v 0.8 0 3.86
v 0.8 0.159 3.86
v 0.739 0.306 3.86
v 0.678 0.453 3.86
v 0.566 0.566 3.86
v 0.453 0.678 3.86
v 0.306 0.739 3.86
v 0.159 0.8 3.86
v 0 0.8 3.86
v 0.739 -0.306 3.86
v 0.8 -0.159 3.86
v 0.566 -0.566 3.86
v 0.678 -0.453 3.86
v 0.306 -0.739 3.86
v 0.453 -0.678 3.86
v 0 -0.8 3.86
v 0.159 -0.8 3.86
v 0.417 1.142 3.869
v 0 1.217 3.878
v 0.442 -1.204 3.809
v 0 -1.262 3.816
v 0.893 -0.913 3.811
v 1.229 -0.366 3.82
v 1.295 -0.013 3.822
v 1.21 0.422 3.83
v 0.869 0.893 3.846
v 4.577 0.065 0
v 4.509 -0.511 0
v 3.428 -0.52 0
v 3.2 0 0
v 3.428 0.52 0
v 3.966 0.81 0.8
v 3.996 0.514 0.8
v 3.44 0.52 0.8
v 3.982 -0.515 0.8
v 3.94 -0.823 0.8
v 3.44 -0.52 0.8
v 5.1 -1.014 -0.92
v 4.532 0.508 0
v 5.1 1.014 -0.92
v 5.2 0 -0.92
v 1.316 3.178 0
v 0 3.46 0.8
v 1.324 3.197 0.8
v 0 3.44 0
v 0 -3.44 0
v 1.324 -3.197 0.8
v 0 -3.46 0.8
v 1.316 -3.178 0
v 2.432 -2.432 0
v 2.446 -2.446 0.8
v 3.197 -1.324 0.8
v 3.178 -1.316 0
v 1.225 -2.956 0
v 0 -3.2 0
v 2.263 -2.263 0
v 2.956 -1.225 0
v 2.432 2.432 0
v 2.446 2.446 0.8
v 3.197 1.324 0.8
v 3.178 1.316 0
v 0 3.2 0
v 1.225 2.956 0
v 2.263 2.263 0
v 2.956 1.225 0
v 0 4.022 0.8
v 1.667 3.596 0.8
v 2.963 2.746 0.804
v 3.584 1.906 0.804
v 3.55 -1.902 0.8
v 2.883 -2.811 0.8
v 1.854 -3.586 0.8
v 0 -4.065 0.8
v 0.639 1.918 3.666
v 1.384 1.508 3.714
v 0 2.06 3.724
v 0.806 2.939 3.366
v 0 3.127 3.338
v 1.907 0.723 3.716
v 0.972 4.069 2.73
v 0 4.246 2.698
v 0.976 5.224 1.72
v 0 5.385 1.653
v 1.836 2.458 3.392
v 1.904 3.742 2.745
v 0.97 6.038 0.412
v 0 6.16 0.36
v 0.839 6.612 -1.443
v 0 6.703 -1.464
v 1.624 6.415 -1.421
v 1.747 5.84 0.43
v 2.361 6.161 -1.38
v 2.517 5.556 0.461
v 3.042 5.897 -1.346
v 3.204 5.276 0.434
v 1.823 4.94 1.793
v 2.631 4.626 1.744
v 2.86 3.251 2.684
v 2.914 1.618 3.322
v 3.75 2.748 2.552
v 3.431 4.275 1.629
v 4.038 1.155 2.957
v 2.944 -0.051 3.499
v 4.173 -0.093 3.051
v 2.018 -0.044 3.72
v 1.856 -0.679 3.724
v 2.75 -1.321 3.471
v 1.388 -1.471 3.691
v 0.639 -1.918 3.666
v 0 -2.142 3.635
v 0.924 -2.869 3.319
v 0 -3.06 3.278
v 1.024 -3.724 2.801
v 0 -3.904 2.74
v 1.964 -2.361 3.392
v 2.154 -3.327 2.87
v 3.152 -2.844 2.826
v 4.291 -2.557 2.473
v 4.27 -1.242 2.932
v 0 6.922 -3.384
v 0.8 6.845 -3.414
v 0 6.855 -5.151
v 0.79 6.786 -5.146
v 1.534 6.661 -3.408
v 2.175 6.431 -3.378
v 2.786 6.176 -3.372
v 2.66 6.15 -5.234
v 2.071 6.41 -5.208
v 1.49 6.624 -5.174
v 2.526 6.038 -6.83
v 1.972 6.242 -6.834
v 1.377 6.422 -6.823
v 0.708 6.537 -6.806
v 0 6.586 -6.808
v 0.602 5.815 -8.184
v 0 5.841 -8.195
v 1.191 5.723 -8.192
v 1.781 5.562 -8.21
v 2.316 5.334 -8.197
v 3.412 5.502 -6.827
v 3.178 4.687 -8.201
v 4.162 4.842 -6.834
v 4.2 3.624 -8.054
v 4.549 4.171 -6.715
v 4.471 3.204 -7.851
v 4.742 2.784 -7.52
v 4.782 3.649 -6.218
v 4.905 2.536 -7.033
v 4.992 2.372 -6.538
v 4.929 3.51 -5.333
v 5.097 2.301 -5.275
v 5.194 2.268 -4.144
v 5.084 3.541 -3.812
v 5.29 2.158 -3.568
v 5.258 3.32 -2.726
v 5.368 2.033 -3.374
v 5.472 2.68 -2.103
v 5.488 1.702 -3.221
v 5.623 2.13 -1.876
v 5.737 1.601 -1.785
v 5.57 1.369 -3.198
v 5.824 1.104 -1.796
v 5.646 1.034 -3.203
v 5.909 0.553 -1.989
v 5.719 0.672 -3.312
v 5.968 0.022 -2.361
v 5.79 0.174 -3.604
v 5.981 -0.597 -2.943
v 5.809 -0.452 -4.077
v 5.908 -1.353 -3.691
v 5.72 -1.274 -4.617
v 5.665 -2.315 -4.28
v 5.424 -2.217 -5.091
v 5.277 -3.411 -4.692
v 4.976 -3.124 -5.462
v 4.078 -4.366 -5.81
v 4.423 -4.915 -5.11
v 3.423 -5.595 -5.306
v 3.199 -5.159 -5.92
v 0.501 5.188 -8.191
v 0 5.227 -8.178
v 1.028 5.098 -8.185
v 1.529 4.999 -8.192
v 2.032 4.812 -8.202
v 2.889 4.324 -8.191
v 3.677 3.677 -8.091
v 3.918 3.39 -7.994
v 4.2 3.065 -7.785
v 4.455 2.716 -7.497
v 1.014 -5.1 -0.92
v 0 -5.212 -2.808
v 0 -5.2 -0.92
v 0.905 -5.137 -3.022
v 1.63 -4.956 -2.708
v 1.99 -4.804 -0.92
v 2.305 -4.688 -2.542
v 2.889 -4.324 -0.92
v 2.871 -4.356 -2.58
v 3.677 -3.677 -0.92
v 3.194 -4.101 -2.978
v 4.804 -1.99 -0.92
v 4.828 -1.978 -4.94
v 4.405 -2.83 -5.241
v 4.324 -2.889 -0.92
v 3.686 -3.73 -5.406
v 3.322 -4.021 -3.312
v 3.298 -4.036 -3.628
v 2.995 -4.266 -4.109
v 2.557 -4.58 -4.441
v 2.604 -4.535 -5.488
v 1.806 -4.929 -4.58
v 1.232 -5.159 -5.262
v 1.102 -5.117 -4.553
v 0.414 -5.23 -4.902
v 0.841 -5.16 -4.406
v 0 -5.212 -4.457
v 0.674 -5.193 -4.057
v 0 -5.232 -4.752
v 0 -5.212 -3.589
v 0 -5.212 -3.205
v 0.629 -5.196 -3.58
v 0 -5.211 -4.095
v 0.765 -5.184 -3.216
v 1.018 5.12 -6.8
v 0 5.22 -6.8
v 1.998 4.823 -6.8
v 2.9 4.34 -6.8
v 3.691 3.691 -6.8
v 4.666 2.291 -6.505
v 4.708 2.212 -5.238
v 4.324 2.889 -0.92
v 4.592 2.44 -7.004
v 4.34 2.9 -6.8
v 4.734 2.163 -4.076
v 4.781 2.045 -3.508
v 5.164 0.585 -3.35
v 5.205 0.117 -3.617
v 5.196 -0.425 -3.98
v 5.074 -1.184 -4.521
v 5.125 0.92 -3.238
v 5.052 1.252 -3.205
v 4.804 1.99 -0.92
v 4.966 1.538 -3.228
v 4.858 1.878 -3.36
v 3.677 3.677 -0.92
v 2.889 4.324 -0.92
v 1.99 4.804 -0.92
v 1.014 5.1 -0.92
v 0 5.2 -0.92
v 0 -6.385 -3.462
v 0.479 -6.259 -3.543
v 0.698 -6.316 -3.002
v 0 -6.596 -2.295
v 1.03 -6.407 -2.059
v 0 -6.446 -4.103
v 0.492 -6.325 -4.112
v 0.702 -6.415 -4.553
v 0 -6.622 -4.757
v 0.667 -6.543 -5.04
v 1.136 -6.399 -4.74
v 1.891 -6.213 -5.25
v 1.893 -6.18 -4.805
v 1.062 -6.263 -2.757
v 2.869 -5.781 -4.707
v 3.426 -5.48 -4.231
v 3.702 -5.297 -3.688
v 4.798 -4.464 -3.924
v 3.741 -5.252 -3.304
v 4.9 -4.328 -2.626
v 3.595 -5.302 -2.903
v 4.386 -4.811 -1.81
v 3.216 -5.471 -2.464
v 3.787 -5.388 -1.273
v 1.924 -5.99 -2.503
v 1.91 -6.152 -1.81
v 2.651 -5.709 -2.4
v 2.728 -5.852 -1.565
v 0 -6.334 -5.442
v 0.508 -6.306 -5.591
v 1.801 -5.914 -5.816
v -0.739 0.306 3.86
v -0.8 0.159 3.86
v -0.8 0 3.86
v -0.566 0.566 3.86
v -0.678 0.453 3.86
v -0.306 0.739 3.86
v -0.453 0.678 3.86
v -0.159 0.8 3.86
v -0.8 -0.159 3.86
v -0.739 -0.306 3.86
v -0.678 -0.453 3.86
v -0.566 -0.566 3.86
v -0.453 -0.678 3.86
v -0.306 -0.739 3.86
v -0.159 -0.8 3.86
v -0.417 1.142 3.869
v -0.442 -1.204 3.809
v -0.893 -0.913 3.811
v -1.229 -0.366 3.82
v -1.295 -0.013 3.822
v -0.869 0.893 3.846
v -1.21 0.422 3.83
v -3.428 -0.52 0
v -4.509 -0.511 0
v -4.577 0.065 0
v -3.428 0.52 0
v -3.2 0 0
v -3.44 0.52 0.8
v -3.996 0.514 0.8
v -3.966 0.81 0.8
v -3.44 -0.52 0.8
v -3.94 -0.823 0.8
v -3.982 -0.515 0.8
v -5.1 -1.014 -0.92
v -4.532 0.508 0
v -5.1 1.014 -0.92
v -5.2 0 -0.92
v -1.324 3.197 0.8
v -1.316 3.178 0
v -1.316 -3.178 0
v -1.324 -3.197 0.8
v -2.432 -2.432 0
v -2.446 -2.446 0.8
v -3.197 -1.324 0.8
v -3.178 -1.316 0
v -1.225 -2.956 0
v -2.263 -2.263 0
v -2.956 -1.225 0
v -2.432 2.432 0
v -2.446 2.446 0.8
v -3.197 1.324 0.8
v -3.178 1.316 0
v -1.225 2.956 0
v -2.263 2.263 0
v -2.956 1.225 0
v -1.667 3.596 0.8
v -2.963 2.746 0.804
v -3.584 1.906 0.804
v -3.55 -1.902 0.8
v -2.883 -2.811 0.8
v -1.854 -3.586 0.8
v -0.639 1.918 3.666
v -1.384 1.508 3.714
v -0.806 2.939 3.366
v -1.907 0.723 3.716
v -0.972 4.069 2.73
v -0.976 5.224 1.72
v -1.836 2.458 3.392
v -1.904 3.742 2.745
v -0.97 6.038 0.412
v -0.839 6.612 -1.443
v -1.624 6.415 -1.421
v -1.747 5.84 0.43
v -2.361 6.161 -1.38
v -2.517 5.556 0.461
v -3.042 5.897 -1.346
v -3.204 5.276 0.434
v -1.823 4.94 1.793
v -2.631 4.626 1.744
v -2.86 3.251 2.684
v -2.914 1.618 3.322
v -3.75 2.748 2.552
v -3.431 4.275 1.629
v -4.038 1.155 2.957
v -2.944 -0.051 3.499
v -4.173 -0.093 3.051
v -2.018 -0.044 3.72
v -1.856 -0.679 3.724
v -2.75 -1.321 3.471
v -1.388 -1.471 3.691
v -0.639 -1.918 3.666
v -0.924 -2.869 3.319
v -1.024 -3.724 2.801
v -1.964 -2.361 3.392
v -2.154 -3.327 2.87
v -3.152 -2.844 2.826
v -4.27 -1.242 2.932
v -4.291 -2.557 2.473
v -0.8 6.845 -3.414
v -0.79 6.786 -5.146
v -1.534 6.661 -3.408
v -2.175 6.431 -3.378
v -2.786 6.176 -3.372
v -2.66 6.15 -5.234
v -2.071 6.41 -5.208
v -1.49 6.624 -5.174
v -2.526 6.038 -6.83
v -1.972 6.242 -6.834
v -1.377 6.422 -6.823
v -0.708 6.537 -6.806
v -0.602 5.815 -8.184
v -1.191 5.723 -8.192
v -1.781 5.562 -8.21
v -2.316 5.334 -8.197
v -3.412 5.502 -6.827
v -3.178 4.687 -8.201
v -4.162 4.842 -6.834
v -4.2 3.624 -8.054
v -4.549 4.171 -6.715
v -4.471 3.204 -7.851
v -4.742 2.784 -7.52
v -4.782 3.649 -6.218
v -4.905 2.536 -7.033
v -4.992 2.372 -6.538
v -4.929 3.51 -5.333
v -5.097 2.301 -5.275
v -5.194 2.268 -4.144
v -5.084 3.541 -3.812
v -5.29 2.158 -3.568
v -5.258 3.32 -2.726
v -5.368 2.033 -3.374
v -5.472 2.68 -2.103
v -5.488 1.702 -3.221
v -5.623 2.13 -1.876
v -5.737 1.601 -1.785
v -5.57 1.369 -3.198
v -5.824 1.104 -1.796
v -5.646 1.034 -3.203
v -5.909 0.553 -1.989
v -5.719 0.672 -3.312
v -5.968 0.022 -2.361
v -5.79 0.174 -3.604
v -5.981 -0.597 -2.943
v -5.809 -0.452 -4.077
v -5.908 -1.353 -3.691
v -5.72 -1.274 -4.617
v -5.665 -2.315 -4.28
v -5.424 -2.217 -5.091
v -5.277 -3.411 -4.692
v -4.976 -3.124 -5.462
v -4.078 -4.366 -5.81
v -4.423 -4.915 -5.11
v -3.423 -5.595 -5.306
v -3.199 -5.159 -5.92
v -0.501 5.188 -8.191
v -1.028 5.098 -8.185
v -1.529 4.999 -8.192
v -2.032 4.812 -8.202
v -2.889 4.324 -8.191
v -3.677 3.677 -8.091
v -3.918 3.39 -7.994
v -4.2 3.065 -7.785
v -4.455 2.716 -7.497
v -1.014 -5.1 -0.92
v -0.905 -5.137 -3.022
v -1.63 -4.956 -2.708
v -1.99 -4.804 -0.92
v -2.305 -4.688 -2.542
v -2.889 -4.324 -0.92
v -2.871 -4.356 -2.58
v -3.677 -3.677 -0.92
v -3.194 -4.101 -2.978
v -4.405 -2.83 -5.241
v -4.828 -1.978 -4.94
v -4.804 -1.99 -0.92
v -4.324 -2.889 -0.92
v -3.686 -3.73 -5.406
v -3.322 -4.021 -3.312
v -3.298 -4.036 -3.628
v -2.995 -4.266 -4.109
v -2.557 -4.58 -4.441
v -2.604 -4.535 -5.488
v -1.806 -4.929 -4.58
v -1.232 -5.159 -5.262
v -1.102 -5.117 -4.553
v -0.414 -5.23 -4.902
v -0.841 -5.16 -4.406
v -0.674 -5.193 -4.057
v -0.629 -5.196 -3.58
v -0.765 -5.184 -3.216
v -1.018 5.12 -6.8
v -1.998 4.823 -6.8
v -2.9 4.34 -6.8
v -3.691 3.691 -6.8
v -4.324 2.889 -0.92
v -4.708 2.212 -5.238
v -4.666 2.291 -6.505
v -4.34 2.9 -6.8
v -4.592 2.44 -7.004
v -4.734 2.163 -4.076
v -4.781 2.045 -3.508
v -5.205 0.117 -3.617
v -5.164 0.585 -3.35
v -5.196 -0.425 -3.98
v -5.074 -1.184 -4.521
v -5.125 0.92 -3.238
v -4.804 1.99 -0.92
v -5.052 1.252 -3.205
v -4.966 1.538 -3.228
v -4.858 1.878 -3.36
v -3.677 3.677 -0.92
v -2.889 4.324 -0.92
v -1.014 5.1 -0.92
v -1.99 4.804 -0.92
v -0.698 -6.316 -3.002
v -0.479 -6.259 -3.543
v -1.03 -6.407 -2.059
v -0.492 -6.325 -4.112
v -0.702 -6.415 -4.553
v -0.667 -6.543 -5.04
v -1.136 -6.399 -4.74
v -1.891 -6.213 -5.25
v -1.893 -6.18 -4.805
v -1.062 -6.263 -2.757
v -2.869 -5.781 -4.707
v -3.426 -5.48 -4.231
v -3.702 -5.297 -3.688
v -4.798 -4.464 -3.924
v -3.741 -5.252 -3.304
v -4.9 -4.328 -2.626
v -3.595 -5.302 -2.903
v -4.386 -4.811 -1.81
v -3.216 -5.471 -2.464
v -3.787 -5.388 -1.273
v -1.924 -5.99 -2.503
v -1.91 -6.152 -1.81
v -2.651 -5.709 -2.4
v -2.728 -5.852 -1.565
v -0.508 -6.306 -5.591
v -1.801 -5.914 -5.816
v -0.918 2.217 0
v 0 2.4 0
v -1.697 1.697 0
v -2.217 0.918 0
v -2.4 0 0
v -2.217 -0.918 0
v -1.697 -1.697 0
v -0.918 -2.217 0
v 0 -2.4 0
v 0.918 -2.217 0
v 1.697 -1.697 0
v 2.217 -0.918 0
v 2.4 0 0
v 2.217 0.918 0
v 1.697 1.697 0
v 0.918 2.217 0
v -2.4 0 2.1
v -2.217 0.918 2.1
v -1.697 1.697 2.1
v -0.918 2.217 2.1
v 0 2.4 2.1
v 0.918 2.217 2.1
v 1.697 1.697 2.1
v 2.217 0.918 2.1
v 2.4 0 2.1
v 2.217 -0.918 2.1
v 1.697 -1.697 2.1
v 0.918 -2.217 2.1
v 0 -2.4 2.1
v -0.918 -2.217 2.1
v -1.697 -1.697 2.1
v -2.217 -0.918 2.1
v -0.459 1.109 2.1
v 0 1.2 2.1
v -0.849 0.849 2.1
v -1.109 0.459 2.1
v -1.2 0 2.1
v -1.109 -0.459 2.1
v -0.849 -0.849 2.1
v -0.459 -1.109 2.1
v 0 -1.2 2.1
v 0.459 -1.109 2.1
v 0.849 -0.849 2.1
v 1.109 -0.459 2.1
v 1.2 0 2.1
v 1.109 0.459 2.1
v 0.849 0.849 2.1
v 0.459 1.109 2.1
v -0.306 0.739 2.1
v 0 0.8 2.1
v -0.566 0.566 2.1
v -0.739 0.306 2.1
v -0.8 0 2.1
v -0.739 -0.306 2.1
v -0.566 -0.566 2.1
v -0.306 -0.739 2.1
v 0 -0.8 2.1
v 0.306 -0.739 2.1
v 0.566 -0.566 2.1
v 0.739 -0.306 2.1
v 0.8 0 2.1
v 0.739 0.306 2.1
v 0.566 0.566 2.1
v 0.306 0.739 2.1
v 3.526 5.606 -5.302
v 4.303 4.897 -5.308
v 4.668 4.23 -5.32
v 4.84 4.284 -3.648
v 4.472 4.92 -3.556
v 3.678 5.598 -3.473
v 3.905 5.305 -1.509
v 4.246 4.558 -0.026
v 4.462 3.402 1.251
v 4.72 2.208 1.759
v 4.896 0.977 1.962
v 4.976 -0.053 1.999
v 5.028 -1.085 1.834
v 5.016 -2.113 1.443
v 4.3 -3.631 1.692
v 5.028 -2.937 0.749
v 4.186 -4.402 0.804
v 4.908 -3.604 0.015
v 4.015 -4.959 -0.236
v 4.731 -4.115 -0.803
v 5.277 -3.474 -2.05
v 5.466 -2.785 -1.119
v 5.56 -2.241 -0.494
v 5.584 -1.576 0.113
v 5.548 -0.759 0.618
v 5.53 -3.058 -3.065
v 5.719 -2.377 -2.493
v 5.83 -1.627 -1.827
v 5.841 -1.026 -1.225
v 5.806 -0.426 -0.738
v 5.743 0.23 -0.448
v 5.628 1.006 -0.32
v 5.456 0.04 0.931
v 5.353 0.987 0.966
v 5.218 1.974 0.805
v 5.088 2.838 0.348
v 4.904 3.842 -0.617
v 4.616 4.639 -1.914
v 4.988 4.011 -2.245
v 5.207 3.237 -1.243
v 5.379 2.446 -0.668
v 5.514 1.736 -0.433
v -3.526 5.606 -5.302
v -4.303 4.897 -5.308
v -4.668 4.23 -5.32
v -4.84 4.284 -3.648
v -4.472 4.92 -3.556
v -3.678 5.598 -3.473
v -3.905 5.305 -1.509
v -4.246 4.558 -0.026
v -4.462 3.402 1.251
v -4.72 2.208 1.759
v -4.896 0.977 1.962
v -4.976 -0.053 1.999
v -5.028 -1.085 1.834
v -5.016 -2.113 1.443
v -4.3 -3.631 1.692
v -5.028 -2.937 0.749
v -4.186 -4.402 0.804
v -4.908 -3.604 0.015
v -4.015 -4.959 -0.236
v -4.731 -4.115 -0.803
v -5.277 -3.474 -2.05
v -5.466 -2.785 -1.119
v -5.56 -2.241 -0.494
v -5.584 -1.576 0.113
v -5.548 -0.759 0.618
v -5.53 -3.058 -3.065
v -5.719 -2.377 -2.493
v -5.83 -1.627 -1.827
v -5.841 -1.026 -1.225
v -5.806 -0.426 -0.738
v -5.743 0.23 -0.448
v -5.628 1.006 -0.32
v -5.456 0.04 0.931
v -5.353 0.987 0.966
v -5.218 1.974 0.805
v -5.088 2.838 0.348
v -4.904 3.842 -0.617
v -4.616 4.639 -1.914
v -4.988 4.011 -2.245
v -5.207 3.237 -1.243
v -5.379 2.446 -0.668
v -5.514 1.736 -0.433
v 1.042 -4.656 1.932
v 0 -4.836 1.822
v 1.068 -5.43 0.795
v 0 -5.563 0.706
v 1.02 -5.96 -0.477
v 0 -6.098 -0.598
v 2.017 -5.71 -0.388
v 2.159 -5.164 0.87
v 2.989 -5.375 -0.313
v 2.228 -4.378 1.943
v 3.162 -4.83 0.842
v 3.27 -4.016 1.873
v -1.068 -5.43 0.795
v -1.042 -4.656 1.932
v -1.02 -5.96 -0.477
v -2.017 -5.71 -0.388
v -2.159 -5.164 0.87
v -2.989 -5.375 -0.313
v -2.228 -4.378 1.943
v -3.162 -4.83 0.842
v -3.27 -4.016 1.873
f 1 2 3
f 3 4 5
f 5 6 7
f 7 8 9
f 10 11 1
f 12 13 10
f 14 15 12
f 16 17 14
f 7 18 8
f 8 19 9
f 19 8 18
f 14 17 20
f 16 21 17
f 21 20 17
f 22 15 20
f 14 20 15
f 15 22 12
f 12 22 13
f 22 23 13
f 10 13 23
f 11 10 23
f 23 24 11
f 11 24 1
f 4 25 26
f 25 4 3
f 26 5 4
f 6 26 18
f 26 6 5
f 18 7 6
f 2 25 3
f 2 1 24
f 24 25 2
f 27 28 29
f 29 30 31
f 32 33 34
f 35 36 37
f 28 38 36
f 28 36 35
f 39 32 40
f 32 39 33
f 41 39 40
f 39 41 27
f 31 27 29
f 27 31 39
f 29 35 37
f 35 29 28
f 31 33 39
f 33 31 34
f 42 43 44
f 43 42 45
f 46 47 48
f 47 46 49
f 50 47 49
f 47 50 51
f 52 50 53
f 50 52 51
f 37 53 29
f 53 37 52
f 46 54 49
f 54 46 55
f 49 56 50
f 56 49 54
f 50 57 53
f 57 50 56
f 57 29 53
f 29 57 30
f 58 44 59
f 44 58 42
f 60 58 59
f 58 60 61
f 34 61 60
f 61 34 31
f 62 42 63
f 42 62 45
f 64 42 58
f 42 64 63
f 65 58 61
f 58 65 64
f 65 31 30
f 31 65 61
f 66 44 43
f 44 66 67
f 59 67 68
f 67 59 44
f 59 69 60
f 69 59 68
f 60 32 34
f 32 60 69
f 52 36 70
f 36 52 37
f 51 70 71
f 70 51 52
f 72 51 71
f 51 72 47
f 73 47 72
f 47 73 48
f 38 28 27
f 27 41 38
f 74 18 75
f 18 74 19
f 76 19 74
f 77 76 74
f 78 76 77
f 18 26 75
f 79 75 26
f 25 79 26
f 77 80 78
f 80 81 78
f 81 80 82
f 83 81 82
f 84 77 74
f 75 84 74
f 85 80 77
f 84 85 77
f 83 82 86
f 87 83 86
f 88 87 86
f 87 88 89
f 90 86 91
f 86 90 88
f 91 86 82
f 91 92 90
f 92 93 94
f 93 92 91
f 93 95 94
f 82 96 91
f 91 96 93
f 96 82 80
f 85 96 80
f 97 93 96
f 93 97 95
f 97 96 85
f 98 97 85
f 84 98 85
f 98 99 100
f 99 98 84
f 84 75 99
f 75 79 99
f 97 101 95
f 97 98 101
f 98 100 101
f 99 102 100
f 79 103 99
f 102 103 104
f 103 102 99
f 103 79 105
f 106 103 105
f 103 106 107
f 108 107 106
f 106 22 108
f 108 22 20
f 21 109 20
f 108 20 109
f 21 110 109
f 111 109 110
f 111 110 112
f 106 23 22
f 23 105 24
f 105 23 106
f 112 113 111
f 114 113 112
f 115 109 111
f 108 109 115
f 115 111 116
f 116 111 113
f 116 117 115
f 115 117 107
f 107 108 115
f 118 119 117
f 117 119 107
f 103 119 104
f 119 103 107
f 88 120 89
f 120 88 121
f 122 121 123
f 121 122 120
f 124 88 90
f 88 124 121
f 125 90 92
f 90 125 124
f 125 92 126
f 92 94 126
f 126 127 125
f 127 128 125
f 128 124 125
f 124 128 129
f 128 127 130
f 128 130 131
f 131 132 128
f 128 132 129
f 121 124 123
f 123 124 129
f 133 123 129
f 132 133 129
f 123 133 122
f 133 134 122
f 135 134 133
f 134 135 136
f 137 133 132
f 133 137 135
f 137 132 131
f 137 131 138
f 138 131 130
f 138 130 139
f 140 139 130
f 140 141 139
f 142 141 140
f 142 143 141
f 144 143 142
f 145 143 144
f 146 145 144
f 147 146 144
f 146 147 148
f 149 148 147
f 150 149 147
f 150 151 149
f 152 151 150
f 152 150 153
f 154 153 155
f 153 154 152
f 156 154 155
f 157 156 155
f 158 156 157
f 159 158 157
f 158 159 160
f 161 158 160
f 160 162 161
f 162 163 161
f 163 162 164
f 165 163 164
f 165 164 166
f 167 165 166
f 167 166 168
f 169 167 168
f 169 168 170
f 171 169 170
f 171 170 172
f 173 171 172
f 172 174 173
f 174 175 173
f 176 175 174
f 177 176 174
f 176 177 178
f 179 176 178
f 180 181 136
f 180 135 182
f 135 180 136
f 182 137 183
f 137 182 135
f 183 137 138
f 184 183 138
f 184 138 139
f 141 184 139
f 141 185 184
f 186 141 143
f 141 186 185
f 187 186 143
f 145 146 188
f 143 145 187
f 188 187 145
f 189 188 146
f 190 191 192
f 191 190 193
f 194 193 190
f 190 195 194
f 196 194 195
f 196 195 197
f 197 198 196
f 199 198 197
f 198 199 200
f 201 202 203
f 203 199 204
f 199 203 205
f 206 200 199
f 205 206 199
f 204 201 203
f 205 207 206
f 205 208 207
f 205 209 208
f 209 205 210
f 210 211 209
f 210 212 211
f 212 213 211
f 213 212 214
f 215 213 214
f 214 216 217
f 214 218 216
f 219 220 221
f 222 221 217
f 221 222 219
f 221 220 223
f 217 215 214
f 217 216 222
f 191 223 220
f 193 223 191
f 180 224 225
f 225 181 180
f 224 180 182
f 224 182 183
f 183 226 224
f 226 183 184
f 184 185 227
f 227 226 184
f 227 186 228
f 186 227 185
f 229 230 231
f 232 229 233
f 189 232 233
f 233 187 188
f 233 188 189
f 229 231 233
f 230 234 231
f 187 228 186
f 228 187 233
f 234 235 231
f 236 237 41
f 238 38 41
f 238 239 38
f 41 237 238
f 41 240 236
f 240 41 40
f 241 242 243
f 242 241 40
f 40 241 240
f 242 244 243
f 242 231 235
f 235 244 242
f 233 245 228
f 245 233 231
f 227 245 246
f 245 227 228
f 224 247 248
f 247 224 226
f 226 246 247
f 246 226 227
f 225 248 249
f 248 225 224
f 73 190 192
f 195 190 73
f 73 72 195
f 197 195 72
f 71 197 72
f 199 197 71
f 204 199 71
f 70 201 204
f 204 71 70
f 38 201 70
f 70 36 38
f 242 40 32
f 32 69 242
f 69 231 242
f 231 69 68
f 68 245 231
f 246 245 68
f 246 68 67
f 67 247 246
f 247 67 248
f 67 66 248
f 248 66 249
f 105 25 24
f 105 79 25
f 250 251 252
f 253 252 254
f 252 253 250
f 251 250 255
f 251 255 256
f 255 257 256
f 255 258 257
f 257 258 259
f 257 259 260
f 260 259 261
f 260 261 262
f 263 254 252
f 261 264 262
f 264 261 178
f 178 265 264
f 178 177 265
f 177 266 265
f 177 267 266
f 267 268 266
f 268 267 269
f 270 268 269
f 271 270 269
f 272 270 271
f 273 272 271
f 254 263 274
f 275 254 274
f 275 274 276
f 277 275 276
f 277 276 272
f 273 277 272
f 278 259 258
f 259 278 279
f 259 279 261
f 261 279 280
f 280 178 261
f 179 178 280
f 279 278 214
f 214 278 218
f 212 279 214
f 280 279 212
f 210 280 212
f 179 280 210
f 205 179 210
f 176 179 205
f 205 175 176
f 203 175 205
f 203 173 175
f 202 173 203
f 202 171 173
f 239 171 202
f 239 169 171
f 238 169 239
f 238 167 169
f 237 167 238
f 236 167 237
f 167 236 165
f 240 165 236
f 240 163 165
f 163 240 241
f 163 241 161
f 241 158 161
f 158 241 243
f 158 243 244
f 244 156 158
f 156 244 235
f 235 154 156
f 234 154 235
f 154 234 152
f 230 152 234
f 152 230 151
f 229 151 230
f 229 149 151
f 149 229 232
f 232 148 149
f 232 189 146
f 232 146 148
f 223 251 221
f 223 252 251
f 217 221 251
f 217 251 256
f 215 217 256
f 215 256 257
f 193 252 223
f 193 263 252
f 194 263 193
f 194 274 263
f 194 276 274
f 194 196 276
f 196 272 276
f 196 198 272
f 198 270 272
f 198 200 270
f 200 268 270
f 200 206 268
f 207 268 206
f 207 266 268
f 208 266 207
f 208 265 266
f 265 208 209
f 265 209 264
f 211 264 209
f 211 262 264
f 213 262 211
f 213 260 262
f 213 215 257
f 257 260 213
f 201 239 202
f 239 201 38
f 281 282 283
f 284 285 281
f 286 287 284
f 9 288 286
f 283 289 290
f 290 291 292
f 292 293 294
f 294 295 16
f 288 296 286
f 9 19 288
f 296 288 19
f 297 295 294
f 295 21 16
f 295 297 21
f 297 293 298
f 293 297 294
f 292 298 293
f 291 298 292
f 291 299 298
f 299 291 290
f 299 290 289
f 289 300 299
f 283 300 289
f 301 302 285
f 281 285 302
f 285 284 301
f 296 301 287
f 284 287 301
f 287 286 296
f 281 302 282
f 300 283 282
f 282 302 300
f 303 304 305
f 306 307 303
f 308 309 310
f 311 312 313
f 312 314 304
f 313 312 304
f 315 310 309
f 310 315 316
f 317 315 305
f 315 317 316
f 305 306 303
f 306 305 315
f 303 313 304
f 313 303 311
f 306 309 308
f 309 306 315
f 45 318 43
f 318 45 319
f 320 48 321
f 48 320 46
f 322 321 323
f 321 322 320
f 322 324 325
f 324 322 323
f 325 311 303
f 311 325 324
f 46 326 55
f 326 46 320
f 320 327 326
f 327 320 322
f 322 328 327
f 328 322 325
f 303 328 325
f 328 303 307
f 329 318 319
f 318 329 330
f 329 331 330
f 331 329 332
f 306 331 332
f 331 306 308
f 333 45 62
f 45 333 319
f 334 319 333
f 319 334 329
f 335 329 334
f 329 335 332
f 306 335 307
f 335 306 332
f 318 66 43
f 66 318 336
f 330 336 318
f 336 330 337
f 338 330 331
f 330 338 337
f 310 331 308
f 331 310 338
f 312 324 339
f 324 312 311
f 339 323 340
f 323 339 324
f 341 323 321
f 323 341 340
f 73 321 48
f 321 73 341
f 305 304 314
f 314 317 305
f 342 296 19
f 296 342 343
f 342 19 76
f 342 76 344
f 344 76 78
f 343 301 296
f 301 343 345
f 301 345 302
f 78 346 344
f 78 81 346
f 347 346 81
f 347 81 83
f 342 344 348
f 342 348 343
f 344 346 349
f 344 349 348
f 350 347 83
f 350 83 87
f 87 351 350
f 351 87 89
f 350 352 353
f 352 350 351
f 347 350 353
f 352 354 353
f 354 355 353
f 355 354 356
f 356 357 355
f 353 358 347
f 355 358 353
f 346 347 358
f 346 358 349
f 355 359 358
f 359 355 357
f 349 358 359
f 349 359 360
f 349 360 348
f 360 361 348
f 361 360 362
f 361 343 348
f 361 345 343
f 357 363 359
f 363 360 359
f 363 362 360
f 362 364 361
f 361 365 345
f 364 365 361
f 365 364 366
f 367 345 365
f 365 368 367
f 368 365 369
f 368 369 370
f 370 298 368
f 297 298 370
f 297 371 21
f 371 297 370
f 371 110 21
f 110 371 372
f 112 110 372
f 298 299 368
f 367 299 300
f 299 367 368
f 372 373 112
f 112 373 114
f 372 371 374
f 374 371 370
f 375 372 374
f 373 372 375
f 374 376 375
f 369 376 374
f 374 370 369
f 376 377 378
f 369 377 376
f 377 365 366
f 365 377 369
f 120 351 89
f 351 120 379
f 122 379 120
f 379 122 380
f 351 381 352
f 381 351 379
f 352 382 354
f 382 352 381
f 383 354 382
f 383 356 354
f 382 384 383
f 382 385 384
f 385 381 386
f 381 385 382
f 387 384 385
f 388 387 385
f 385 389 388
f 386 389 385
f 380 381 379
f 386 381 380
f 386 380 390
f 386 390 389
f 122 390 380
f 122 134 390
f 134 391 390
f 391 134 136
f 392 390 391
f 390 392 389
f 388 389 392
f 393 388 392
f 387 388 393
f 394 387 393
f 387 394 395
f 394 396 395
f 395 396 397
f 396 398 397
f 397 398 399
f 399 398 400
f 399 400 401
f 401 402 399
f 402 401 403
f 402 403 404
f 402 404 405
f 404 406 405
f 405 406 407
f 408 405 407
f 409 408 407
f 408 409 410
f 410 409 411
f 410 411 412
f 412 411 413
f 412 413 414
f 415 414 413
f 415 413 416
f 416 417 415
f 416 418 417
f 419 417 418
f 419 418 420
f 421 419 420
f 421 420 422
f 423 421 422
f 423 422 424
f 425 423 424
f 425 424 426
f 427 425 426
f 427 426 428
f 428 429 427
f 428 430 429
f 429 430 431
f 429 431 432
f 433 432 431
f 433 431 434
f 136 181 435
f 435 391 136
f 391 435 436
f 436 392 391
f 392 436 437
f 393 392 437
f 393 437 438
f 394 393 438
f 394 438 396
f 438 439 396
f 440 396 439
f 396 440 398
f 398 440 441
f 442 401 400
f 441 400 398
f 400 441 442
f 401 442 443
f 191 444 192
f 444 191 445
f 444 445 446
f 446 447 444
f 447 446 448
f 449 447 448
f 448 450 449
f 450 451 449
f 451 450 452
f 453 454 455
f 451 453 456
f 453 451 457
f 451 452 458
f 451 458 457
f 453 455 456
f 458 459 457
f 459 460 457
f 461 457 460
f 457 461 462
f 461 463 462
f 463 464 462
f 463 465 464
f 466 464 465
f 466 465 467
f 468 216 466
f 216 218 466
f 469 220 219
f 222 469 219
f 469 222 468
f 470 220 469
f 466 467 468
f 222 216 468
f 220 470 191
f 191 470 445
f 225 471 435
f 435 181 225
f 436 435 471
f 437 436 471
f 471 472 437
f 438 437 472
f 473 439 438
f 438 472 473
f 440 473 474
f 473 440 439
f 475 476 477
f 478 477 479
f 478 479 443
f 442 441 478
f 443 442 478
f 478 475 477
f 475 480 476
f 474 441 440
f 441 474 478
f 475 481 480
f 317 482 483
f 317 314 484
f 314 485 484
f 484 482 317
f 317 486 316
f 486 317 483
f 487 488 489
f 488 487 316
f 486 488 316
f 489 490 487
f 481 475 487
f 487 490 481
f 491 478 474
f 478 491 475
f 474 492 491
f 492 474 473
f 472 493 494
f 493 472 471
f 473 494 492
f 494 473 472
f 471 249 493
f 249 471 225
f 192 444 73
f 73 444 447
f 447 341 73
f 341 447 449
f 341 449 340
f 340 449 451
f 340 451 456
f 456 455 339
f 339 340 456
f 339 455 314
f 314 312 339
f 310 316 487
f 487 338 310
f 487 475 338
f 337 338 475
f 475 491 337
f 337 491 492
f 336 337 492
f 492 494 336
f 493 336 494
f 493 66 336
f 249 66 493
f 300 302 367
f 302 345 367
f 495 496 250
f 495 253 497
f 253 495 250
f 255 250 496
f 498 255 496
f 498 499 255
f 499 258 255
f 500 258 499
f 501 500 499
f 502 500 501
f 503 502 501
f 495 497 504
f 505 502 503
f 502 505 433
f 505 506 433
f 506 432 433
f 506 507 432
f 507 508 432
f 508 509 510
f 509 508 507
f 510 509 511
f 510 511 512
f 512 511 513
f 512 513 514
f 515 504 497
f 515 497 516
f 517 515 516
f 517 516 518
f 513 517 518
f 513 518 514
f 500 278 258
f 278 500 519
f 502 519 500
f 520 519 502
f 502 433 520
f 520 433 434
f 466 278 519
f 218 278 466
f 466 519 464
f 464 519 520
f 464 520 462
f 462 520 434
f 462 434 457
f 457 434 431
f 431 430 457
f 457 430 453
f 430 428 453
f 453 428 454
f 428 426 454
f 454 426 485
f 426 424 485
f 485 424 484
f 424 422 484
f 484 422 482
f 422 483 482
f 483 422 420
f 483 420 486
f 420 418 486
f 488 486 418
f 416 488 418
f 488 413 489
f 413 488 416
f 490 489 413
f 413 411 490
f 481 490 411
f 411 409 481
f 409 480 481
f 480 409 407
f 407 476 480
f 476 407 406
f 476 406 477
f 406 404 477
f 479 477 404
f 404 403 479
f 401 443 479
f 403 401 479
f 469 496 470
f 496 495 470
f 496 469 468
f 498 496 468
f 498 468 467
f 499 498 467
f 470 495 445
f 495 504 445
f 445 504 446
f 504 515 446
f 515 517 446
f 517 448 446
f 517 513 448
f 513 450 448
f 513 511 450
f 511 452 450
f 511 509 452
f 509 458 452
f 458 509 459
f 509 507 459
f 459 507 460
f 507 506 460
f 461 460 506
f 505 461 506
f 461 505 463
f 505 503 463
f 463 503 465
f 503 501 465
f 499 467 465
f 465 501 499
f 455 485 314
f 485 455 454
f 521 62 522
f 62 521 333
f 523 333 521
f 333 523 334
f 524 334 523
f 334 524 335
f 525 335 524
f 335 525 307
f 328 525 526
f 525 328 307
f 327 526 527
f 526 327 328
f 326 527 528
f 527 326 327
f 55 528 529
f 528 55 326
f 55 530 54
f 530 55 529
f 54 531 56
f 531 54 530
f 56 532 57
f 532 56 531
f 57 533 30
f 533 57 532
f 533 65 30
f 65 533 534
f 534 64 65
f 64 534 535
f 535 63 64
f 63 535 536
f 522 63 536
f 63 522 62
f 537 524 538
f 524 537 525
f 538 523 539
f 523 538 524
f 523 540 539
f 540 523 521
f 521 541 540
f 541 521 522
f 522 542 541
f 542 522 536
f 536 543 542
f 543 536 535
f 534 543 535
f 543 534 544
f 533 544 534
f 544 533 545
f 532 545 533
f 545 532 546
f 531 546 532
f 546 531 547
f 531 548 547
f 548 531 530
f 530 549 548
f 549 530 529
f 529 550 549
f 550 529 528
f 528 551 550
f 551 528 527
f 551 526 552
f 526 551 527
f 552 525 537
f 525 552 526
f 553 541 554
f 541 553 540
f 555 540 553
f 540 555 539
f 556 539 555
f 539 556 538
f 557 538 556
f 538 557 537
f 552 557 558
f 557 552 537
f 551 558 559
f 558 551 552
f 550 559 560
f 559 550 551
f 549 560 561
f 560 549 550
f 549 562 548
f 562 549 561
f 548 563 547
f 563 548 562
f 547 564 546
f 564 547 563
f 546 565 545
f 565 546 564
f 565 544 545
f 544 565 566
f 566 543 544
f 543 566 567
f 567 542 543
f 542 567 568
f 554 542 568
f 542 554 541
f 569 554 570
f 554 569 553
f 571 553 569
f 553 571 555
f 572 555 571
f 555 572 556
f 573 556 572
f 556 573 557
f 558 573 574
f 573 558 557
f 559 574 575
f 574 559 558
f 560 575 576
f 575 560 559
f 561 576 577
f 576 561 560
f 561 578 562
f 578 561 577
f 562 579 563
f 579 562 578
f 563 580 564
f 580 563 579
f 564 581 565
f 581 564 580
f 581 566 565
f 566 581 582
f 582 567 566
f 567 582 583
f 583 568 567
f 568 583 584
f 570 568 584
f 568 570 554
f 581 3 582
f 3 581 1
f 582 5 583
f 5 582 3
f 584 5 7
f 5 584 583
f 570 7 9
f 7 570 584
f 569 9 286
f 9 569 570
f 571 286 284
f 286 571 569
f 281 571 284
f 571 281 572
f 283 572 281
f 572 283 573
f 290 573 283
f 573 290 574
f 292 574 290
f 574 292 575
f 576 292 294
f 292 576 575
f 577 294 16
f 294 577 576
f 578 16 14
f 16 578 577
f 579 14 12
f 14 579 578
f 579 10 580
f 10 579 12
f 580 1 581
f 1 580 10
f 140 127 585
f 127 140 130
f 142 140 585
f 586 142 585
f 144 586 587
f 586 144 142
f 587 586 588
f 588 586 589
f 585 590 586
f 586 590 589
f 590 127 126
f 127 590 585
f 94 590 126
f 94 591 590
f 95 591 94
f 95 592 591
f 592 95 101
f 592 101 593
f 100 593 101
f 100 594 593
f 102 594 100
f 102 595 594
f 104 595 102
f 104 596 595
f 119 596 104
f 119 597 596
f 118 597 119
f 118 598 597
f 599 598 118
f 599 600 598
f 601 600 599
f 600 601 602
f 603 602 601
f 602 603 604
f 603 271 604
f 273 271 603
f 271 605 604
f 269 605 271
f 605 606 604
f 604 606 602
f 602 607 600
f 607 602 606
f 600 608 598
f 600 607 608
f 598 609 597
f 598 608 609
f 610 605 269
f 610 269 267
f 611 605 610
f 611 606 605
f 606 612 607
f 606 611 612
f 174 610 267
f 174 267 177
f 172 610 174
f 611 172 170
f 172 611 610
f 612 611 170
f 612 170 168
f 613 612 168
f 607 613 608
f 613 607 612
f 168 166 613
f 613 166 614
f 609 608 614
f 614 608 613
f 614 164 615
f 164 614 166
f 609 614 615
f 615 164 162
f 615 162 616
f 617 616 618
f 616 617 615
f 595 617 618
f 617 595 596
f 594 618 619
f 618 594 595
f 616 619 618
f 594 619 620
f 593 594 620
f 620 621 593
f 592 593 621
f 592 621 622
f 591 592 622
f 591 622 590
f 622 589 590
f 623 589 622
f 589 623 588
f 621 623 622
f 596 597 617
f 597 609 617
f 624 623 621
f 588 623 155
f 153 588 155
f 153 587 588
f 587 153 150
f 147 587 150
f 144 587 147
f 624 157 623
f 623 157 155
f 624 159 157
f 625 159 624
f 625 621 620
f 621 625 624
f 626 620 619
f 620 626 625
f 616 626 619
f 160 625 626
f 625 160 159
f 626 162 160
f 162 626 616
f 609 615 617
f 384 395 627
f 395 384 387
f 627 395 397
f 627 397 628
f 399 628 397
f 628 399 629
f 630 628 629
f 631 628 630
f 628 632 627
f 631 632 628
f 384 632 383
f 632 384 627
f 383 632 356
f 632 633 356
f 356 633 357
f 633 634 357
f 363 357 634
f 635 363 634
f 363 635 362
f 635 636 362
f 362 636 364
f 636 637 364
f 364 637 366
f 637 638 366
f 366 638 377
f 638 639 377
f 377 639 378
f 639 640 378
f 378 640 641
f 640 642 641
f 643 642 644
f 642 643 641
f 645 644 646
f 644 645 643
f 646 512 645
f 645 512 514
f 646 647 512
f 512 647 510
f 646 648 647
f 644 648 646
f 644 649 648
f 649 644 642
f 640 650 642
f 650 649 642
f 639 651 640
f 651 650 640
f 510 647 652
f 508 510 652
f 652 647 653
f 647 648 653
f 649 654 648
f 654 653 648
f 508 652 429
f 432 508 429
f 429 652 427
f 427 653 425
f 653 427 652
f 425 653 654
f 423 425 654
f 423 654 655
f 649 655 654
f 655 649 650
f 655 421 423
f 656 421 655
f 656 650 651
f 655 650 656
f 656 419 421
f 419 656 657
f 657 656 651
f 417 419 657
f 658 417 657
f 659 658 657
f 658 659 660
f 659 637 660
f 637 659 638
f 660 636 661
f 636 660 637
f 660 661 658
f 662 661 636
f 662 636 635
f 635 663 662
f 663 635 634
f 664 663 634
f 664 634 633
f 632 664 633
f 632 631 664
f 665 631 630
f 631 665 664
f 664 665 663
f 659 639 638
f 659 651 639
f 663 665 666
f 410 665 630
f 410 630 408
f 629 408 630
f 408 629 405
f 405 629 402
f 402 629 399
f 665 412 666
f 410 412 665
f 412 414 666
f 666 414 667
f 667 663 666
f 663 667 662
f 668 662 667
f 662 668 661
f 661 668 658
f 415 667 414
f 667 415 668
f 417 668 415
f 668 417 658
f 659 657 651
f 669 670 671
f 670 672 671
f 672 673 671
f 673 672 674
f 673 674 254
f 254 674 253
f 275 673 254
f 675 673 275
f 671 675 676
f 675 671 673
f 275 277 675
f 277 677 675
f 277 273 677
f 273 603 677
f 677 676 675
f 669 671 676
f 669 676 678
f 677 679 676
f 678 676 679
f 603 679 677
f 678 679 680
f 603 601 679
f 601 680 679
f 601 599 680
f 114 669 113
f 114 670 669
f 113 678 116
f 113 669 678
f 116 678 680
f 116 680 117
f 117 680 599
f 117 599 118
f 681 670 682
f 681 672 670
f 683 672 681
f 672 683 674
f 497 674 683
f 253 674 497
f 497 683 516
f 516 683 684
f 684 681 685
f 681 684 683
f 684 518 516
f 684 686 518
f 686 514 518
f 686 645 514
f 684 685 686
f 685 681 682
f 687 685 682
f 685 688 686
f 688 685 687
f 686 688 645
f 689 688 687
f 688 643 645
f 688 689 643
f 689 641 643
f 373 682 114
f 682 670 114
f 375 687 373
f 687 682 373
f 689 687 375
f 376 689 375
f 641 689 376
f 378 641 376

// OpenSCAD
use <../lib.scad>
use <s/49556s01.scad>
use <s/49556s03.scad>
use <s/49556s04.scad>
function ldraw_lib__49556() = [
// 0 Minifig Helmet with Mask
// 0 Name: 49556.dat
// 0 Author: Orion Pobursky [OrionP]
// 0 !LDRAW_ORG Part UPDATE 2026-01
// 0 !LICENSE Licensed under CC BY 4.0 : see CAreadme.txt
// 
// 0 BFC CERTIFY CCW
  [0,"BFC","CERTIFY"],
  [0,"BFC","CCW"],
// 
// 0 !CATEGORY Minifig Headwear
// 
// 0 !HISTORY 2022-10-25 {LEGO Instructions App} Original part shape
// 0 !HISTORY 2022-10-25 [OrionP] File preparation for LDraw Parts Tracker
// 0 !HISTORY 2022-10-29 [MagFors] Subfiled
// 0 !HISTORY 2026-01-29 [OrionP] Official Update 2026-01
// 
// 
// 1 16 0 0 0 1 0 0 0 1 0 0 0 1 s\49556s01.dat
  [1,16,0,0,0,1,0,0,0,1,0,0,0,1, ldraw_lib__s__49556s01()],
// 1 16 0 0 0 1 0 0 0 1 0 0 0 1 s\49556s03.dat
  [1,16,0,0,0,1,0,0,0,1,0,0,0,1, ldraw_lib__s__49556s03()],
// 1 16 0 0 0 -1 0 0 0 1 0 0 0 1 s\49556s03.dat
  [1,16,0,0,0,-1,0,0,0,1,0,0,0,1, ldraw_lib__s__49556s03()],
// 1 16 0 0 0 1 0 0 0 1 0 0 0 1 s\49556s04.dat
  [1,16,0,0,0,1,0,0,0,1,0,0,0,1, ldraw_lib__s__49556s04()],
// 1 16 0 0 0 -1 0 0 0 1 0 0 0 1 s\49556s04.dat
  [1,16,0,0,0,-1,0,0,0,1,0,0,0,1, ldraw_lib__s__49556s04()],
];
module ldraw_lib__49556(step=0, col=false, unit=2/5, alt=false, line=0.2, solid=!$preview)
    makepoly(ldraw_lib__49556(), step=step, col=col, unit=unit, alt=alt, line=line, solid=solid);
ldraw_lib__49556(line=0.2);
